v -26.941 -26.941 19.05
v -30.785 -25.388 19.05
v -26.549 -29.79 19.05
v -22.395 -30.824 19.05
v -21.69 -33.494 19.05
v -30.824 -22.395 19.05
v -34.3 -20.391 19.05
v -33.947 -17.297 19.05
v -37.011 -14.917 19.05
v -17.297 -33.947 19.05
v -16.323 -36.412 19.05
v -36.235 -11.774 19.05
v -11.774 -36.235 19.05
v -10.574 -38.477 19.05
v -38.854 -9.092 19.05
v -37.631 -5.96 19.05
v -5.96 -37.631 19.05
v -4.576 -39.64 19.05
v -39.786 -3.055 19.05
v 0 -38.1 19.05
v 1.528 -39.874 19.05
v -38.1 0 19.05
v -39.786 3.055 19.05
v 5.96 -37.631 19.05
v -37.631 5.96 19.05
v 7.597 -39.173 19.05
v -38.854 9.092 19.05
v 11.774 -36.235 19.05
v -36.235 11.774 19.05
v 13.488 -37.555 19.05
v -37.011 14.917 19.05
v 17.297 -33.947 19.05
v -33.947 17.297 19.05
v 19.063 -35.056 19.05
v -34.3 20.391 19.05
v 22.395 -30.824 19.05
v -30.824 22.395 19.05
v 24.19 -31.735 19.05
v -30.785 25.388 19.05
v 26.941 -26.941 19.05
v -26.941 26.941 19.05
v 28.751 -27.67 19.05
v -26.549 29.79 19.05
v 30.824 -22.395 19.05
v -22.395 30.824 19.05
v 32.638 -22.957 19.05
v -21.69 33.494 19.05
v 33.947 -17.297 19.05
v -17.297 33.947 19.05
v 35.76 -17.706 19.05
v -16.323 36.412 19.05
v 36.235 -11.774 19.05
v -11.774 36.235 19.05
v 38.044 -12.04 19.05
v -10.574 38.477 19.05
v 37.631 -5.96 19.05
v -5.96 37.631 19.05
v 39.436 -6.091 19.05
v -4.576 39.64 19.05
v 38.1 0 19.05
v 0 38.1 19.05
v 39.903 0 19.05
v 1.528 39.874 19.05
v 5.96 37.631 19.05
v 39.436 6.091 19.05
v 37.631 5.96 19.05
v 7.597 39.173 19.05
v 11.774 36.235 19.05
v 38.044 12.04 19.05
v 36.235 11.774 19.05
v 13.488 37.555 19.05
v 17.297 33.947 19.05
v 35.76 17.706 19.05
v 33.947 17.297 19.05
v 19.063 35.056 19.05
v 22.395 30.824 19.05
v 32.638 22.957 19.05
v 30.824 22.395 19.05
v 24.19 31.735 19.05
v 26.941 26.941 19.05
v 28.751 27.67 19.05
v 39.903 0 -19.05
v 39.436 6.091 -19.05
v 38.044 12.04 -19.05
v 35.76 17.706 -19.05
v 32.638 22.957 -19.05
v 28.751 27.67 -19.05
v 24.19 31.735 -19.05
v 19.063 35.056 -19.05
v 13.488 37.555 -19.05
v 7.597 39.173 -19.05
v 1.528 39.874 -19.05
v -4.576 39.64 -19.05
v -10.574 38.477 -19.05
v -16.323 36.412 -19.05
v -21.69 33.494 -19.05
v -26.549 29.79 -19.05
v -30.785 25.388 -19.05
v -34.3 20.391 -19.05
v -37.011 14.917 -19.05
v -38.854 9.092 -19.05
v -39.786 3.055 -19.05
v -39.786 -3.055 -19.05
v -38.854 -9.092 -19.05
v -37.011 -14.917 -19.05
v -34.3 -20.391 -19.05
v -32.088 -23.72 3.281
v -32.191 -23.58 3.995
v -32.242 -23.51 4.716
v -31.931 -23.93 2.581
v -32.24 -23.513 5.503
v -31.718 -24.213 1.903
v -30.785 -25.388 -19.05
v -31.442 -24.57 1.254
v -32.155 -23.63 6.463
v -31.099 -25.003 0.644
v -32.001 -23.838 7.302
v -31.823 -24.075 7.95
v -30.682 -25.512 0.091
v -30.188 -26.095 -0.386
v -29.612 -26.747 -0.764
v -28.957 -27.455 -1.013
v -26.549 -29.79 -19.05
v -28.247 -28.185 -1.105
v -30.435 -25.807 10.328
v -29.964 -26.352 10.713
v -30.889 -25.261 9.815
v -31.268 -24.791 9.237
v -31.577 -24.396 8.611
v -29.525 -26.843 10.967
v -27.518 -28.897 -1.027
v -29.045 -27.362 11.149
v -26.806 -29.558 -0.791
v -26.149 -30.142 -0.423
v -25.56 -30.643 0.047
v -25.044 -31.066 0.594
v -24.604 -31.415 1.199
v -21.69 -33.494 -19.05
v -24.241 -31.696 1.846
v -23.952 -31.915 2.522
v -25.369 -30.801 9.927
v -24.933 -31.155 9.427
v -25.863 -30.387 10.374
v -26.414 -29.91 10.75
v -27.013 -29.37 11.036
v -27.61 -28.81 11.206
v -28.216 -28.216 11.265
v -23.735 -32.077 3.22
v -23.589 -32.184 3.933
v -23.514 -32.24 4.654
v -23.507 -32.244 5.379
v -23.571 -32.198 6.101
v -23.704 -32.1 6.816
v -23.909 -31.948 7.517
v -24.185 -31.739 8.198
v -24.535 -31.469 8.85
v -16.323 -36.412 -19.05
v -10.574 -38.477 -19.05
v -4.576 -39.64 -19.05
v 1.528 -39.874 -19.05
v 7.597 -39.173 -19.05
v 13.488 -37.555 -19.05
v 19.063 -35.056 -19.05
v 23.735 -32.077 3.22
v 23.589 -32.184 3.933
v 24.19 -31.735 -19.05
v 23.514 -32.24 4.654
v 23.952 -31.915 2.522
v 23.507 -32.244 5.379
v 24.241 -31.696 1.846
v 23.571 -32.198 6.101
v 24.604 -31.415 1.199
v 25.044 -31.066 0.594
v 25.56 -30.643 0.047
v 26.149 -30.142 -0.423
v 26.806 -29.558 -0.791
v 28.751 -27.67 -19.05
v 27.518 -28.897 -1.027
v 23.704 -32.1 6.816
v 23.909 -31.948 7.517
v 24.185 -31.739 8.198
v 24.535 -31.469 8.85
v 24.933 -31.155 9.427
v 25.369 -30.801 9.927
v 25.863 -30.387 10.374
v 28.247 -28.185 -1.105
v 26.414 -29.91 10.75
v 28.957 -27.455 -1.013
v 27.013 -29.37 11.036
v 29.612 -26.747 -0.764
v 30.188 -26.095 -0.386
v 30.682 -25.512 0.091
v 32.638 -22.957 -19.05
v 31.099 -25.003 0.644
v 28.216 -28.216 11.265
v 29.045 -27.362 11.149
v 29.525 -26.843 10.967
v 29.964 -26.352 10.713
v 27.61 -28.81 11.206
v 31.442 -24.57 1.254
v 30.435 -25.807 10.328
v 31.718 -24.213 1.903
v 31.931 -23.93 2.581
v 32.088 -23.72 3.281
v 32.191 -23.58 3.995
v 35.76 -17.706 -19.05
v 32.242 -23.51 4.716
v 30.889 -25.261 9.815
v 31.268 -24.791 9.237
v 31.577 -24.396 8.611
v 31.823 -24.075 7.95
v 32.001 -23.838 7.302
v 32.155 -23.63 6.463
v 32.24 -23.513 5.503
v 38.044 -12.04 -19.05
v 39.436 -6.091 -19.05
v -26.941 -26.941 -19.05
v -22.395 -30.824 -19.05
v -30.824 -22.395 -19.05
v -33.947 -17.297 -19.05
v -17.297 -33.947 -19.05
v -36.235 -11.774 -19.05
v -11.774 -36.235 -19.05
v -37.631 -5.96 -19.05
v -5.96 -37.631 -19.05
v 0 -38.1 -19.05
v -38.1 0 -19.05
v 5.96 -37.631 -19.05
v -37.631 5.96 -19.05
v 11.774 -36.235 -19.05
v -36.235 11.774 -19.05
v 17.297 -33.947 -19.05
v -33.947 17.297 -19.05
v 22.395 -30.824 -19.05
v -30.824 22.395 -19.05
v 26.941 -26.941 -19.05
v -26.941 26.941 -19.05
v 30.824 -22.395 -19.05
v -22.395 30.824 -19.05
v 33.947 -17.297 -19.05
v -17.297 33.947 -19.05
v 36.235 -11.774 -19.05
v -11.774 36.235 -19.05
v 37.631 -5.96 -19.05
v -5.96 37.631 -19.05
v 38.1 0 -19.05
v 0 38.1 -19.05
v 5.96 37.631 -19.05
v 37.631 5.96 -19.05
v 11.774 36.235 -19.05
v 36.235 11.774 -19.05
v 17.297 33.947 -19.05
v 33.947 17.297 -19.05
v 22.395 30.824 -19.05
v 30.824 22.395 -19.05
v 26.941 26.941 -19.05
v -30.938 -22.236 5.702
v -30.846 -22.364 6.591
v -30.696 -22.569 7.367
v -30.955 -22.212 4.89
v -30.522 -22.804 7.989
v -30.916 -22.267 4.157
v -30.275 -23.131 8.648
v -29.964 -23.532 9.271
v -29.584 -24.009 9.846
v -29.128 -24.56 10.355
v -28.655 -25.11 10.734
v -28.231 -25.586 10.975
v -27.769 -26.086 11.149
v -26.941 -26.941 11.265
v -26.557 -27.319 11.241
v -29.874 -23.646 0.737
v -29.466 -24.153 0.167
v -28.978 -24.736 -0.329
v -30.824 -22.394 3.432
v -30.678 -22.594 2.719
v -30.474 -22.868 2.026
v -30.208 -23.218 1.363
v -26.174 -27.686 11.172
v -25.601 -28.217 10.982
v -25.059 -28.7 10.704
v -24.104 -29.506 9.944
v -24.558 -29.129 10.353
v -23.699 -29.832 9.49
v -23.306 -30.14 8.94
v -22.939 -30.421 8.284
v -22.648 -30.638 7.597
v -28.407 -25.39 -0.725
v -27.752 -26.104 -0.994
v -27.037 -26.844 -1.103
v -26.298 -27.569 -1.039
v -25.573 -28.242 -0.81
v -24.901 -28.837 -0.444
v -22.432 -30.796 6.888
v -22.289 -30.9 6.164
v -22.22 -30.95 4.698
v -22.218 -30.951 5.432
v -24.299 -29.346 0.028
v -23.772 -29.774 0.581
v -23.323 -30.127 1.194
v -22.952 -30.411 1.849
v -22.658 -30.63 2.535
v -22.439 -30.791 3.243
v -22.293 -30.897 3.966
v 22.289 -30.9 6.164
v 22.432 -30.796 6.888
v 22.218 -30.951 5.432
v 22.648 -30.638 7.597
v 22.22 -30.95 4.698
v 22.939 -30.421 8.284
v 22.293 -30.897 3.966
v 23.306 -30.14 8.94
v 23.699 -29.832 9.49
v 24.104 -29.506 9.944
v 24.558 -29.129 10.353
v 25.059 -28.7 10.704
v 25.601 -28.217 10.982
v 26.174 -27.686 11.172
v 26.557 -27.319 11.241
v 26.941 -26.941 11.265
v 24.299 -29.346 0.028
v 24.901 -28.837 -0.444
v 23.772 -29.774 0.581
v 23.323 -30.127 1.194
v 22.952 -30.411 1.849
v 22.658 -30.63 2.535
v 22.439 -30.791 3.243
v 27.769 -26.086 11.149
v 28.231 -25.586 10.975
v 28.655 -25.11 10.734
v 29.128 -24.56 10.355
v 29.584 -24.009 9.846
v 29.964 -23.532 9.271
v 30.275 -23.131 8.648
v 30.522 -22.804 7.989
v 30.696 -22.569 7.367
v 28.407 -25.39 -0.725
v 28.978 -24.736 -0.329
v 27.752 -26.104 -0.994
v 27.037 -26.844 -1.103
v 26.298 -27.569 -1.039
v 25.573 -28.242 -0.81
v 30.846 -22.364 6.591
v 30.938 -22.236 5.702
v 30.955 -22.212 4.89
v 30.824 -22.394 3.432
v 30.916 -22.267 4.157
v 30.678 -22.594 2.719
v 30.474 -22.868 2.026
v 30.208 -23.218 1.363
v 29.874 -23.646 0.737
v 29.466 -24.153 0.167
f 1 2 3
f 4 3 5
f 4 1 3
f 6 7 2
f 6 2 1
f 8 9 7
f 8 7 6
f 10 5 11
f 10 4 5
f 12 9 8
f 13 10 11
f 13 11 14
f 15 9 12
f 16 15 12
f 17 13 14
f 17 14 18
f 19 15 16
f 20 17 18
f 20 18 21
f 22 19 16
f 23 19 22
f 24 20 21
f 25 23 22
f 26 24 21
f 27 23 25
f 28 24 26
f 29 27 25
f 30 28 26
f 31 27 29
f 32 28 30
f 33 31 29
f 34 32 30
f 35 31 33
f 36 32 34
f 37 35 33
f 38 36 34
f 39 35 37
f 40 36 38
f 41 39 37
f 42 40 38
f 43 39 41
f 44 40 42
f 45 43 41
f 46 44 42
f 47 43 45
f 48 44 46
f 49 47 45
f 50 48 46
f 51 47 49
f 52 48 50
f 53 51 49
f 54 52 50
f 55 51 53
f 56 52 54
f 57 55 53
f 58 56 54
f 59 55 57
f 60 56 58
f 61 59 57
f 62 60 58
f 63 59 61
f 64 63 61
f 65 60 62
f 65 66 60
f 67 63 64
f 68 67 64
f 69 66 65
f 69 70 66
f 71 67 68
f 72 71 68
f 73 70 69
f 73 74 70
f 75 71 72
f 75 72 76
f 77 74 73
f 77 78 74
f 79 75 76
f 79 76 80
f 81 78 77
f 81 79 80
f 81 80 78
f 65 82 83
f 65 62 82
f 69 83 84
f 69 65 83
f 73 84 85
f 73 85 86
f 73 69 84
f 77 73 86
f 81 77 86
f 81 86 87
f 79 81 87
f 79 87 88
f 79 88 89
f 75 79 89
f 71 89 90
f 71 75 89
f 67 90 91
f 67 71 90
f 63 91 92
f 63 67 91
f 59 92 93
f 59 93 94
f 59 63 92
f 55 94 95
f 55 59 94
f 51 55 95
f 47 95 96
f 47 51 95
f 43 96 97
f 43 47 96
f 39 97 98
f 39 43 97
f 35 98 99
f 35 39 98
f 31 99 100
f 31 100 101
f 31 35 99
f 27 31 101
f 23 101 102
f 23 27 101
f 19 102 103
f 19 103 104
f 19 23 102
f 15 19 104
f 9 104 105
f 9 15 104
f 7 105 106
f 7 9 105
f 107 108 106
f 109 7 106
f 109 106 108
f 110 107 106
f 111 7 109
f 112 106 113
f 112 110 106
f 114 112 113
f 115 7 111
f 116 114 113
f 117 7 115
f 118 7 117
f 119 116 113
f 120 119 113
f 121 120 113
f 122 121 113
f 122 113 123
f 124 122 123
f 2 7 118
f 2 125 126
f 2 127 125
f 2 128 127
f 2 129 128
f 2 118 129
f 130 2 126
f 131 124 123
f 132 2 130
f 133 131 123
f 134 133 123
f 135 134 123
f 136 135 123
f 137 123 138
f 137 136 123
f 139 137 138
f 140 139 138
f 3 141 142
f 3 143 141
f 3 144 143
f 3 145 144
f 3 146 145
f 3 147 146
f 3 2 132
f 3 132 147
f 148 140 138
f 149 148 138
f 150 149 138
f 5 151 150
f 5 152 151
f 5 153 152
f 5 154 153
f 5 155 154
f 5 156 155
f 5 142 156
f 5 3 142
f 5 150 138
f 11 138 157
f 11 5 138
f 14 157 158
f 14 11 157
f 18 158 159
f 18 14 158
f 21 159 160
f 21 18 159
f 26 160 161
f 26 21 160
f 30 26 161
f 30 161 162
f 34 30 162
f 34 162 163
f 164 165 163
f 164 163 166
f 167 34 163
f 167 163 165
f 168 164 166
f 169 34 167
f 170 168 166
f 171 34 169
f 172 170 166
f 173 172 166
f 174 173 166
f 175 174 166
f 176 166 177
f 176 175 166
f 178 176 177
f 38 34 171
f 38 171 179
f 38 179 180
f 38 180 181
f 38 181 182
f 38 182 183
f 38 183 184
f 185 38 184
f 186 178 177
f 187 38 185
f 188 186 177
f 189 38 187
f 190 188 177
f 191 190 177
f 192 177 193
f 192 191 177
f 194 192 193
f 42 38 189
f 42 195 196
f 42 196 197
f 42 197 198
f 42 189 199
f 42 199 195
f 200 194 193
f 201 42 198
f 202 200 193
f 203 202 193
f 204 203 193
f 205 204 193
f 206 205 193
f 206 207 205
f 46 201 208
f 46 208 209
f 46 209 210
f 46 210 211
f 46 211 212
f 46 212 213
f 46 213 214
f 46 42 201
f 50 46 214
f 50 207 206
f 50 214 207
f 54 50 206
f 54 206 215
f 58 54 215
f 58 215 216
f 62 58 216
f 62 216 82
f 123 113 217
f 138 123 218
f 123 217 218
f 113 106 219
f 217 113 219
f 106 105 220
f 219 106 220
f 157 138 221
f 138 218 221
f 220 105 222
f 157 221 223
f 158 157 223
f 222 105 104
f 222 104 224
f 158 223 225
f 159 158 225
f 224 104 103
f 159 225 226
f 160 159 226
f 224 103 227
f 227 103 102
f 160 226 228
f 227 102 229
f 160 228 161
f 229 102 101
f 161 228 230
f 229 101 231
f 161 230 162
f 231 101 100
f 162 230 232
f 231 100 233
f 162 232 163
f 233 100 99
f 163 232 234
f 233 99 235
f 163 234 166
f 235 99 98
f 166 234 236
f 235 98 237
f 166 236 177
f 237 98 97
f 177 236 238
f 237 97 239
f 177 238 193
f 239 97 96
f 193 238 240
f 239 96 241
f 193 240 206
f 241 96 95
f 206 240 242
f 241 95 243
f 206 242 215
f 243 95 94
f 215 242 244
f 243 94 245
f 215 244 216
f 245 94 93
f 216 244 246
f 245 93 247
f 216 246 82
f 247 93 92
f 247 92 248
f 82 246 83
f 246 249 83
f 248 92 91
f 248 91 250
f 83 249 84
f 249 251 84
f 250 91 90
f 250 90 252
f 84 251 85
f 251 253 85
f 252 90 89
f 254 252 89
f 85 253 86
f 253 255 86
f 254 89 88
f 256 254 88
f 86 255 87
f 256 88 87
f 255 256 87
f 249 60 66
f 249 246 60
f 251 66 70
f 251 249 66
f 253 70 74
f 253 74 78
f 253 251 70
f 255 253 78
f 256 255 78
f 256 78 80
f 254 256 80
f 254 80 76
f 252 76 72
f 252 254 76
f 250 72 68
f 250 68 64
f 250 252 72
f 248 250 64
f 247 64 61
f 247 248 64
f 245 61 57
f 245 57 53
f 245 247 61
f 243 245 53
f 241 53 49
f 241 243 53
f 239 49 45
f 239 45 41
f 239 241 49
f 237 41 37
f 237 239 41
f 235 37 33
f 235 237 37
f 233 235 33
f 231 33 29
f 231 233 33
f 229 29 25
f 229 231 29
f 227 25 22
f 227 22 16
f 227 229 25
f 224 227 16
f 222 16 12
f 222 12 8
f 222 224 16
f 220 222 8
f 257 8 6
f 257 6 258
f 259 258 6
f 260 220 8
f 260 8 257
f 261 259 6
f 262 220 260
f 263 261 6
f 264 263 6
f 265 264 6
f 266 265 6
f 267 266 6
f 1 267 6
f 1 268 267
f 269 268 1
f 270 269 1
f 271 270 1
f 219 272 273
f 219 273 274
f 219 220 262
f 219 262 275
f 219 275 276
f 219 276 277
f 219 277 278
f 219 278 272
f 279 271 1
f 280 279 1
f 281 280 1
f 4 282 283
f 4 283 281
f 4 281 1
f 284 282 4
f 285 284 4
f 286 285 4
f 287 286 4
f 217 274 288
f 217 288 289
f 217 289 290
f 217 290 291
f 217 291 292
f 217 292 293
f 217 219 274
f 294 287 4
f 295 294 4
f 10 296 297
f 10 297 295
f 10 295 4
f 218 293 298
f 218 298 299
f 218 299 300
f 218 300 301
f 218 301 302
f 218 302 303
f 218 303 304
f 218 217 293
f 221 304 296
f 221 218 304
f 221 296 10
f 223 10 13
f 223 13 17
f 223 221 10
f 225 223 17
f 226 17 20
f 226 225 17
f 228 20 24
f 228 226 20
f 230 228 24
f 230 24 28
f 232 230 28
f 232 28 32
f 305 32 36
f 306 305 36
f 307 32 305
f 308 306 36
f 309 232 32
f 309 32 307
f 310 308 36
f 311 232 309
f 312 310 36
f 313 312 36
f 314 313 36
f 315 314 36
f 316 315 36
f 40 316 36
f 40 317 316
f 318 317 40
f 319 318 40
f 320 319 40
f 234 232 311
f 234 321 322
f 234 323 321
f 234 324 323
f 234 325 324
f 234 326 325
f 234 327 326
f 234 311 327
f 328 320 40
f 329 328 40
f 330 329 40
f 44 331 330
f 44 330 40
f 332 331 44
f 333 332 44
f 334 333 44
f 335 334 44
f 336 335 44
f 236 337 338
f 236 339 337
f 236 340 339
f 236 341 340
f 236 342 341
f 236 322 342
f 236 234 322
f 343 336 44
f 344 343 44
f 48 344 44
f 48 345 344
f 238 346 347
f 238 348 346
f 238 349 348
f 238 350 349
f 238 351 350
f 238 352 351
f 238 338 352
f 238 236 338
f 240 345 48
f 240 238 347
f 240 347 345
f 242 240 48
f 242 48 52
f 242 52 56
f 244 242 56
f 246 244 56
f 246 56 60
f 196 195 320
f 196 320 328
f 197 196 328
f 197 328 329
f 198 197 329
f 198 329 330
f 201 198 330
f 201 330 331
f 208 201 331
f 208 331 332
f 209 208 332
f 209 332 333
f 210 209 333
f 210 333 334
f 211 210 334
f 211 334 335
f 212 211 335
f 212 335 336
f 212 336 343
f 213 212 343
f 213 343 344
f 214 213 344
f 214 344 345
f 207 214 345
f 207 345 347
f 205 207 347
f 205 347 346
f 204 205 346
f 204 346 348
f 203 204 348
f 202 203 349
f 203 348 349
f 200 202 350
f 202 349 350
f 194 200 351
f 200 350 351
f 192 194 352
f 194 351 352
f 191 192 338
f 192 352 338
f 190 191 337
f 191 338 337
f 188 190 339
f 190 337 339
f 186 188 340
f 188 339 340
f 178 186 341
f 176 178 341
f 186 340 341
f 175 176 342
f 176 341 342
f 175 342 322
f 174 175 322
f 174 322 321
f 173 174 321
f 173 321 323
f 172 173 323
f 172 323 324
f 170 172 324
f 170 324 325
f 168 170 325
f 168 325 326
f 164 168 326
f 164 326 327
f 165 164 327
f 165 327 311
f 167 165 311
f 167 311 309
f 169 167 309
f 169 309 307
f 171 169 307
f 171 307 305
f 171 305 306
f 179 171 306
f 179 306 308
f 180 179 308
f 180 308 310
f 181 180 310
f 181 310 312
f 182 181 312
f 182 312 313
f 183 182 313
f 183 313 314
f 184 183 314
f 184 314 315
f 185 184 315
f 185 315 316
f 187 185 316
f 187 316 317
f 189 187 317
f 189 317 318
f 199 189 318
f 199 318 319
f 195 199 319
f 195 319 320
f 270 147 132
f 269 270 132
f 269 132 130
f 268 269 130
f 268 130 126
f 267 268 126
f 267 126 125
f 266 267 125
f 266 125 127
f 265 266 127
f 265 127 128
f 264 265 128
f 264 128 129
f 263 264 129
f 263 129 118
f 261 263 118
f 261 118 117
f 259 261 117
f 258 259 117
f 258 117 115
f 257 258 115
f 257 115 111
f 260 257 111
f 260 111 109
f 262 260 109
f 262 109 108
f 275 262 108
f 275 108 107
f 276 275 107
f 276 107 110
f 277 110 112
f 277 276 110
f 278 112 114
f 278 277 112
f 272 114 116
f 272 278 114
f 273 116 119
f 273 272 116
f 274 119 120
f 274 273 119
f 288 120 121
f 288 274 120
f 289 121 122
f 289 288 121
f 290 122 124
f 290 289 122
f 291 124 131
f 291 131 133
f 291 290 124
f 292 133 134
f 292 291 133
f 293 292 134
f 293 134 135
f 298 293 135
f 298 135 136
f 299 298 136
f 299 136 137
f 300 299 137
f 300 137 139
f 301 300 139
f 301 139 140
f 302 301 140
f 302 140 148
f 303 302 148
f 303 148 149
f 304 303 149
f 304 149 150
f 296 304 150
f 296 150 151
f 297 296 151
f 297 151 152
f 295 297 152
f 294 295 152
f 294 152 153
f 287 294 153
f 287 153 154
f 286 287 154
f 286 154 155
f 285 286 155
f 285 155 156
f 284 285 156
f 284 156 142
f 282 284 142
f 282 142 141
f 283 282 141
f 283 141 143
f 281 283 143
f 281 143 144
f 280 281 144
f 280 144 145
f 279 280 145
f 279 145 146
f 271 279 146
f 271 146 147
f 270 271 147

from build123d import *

# Parameters (mm, degrees)
SKETCH1_R           = 39.9034
SKETCH1_R_2         = 38.1
BOSS_EXTRUDE1_DEPTH = 19.05
SKETCH2_R           = 6.1849
CUT_EXTRUDE1_DEPTH  = 60.560600762
SKETCH3_R           = 6.1849
CUT_EXTRUDE2_DEPTH  = 60.560600928


with BuildPart() as part:
    # Sketch1 → Boss-Extrude1 (new, symmetric)
    with BuildSketch(Plane.XY):
        Circle(SKETCH1_R)
        Circle(SKETCH1_R_2, mode=Mode.SUBTRACT)
    extrude(amount=BOSS_EXTRUDE1_DEPTH, both=True)

    # Sketch2 → Cut-Extrude1 (cut, through all)
    with BuildSketch(Plane(origin=(0, 0, 0), x_dir=(0, 0, 1), z_dir=(-0.7071067811865488, 0.7071067811865464, 0))):
        with Locations((5.08, 0)):
            Circle(SKETCH2_R)
    extrude(amount=-CUT_EXTRUDE1_DEPTH, mode=Mode.SUBTRACT)

    # Sketch3 → Cut-Extrude2 (cut, through all)
    with BuildSketch(Plane(origin=(0, 0, 0), x_dir=(0, 0, 1), z_dir=(-0.7071067811865464, -0.7071067811865488, 0))):
        with Locations((5.08, 0)):
            Circle(SKETCH3_R)
    extrude(amount=CUT_EXTRUDE2_DEPTH, mode=Mode.SUBTRACT)


solid = part.part
